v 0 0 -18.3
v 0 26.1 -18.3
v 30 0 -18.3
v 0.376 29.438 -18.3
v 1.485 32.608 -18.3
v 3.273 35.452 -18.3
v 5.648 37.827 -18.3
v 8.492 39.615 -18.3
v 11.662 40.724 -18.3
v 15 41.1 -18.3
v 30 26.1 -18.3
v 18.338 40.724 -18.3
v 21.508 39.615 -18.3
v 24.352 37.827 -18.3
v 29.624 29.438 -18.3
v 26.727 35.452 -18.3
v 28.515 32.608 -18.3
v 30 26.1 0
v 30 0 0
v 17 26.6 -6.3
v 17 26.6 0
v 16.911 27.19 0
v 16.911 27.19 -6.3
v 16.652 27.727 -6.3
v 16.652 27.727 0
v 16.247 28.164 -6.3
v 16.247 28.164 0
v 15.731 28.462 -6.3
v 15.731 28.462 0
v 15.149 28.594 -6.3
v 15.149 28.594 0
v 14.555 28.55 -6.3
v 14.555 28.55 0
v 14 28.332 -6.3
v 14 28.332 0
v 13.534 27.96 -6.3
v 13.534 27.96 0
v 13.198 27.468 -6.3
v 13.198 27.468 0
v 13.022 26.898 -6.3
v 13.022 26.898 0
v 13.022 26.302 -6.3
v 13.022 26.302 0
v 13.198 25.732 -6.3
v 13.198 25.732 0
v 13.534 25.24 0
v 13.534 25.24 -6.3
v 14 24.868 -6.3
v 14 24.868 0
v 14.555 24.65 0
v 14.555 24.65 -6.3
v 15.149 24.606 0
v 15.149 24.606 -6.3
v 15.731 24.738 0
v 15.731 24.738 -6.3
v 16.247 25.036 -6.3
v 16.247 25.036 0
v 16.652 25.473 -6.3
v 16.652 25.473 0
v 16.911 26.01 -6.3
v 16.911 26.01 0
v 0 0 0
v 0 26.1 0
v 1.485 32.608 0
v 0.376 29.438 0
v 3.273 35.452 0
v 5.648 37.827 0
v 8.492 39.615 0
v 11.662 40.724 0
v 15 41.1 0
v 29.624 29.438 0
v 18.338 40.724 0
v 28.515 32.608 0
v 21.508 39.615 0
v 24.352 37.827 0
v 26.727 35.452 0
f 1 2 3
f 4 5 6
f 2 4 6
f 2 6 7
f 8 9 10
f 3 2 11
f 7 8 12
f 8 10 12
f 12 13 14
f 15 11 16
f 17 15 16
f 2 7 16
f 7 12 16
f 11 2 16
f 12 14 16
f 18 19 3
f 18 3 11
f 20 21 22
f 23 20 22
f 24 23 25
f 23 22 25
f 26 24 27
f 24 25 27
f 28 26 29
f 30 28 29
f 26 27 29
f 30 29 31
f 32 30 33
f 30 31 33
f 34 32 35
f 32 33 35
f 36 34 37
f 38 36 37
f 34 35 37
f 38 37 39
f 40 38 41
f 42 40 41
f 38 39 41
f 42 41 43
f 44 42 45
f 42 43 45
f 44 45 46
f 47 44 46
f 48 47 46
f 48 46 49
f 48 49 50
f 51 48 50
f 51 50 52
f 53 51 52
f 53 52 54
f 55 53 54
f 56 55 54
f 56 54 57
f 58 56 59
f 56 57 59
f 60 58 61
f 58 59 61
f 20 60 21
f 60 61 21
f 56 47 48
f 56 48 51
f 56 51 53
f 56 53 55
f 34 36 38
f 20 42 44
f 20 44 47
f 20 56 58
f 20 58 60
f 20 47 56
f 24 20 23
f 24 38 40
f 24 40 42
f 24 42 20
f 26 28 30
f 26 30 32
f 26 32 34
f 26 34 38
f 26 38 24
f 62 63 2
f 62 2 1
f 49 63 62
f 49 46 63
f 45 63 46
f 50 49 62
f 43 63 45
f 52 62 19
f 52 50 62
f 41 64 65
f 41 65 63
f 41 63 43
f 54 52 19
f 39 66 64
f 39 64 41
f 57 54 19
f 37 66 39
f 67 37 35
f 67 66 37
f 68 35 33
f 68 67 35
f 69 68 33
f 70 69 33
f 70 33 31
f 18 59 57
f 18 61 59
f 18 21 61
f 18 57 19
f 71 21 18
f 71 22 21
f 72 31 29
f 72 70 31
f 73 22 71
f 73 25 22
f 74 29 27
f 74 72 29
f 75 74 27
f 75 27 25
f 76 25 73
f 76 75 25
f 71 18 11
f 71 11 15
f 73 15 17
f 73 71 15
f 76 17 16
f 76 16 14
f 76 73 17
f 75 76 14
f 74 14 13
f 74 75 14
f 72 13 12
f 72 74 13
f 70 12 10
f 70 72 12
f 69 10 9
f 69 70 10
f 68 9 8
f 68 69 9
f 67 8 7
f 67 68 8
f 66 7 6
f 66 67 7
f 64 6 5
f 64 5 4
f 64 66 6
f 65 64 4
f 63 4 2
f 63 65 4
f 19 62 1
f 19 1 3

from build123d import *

# Parameters (mm, degrees)
EXTRUSION1_DEPTH = 18.3
ESQUISSE2_R      = 2
EXTRUSION2_DEPTH = 6.3


with BuildPart() as part:
    # Esquisse1 → Extrusion1 (new body)
    with BuildSketch(Plane.XY):
        with BuildLine():
            Line((0, 0), (30, 0))
            Line((30, 0), (30, 26.1))
            ThreePointArc((30, 26.1), (15, 41.1), (0, 26.1))
            Line((0, 26.1), (0, 0))
        make_face()
    extrude(amount=-EXTRUSION1_DEPTH)

    # Esquisse2 → Extrusion2 (cut)
    with BuildSketch(Plane.XY):
        with Locations((15, 26.6)):
            Circle(ESQUISSE2_R)
    extrude(amount=-EXTRUSION2_DEPTH, mode=Mode.SUBTRACT)


solid = part.part
